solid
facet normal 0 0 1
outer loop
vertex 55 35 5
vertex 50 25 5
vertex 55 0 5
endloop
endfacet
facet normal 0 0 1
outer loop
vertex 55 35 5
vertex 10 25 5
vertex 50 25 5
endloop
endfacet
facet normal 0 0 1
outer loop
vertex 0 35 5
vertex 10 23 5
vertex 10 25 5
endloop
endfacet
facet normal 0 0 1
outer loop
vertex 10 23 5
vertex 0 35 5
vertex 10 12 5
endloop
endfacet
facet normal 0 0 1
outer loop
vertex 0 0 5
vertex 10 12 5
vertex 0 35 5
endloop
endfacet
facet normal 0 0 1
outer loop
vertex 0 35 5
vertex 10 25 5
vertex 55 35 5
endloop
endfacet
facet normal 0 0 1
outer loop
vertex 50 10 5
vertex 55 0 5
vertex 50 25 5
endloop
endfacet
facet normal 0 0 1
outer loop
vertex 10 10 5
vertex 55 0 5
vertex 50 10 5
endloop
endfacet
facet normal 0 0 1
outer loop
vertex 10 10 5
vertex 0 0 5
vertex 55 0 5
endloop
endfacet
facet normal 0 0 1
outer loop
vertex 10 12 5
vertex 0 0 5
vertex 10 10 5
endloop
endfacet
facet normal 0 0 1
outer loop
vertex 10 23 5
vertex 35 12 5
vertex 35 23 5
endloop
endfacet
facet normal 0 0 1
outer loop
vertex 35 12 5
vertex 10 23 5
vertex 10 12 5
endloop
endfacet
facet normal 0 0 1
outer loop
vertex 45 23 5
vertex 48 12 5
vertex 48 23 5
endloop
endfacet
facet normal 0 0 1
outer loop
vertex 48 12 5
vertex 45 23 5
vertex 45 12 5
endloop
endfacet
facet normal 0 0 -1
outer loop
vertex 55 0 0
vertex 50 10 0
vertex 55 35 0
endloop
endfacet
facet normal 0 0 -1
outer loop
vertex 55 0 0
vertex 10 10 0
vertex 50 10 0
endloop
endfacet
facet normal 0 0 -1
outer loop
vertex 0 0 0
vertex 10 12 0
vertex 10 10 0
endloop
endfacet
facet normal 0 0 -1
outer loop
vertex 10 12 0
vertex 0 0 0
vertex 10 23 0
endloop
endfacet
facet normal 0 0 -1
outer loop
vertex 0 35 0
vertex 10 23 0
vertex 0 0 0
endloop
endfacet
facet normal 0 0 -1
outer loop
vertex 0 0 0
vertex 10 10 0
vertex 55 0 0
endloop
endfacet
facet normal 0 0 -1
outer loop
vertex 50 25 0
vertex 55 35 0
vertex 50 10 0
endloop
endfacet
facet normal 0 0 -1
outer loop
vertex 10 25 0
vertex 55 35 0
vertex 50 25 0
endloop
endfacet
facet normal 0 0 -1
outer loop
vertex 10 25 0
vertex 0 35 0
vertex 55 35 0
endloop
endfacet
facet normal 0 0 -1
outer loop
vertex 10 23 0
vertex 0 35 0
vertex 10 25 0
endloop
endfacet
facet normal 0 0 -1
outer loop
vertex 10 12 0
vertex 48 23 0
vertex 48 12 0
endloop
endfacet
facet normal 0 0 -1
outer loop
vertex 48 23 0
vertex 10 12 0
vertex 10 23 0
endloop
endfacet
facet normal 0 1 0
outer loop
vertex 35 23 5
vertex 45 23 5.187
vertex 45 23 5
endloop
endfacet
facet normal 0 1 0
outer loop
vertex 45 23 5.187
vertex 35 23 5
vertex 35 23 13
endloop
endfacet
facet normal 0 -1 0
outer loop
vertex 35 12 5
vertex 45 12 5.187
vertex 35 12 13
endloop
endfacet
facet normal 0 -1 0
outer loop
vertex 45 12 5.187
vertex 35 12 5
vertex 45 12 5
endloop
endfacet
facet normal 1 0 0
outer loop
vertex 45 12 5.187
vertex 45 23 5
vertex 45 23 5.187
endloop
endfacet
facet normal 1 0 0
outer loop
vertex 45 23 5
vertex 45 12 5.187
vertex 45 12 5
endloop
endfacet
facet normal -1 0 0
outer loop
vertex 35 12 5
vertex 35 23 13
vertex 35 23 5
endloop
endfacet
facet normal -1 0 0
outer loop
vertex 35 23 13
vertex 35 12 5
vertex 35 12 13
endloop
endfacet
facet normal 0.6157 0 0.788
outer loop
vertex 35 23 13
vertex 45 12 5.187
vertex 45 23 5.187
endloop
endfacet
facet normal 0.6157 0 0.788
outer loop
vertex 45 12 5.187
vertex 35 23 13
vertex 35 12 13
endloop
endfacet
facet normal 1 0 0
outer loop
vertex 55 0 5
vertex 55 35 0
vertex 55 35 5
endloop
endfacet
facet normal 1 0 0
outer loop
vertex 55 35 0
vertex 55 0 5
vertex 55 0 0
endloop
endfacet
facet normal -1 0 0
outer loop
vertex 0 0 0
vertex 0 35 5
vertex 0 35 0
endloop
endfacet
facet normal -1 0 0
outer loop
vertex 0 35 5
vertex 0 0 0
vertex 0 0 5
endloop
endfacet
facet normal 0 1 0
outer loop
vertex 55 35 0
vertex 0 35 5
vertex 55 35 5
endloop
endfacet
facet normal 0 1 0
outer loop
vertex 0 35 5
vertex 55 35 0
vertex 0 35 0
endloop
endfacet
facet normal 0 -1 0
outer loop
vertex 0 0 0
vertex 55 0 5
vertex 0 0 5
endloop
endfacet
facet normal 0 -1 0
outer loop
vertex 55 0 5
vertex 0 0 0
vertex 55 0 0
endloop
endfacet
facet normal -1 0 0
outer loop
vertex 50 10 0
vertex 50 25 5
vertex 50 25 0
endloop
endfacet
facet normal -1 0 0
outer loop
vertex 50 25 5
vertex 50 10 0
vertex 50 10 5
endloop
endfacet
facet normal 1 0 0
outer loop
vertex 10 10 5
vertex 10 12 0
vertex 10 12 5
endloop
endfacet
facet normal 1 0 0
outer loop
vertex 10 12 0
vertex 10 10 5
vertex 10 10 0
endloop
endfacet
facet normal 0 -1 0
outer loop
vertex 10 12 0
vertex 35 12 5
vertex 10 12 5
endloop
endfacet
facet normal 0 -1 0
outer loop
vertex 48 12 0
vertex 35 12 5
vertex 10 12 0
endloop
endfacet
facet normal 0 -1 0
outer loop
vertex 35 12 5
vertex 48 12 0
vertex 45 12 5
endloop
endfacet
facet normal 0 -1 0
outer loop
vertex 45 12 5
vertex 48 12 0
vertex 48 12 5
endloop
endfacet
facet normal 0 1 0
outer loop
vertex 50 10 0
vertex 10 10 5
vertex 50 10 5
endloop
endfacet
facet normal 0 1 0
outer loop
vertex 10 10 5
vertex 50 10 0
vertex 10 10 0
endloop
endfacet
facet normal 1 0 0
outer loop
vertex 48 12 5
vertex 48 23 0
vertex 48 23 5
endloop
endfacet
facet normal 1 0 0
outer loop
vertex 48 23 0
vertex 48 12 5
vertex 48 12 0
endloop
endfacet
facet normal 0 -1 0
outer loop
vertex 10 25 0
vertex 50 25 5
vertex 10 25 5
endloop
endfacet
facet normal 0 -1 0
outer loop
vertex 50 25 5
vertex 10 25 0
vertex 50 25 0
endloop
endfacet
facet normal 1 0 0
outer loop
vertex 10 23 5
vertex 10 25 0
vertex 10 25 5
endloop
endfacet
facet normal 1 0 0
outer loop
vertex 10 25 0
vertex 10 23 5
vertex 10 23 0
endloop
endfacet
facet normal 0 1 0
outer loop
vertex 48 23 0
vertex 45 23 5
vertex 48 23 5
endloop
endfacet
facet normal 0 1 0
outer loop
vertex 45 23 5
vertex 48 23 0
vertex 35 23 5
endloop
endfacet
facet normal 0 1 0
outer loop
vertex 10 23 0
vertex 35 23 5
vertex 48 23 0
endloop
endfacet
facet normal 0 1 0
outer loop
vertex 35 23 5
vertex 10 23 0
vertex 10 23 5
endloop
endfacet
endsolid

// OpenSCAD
// file: clip_module.scad
// holding clip
// 08.08.2026 Sebastian Weigl

// this will be the module clip for my
// rack mount unify flex
$fn=64;

dif_border=2;
thick=5;
leng=40;

module clip() {
difference() {
  union() {
    translate([0,dif_border,0]) cube([leng-dif_border,11,thick],center=false);
    translate([leng-13-dif_border,2,5]) rotate([0,0,0]) cube([10,11,8],center=false);
  }
  translate([leng-13-dif_border,2,13]) rotate([0,38,0]) cube([12.8,11,8],center=false);
 }
}


module clip_diff() {
difference() {
  union() {
    translate([0,0,0]) cube([leng,dif_border,thick],center=false);
    translate([leng-dif_border,0,0]) cube([dif_border,15,thick],center=false);
    translate([0,13,0]) cube([leng,dif_border,thick],center=false);
  }
}
}
// main file
// clip test

include <clip_module.scad>

difference() {
union() {
translate([10,10,0]) #clip();
cube([55,35,5],center=false);}
translate([10,10,0]) #clip_diff();
}
